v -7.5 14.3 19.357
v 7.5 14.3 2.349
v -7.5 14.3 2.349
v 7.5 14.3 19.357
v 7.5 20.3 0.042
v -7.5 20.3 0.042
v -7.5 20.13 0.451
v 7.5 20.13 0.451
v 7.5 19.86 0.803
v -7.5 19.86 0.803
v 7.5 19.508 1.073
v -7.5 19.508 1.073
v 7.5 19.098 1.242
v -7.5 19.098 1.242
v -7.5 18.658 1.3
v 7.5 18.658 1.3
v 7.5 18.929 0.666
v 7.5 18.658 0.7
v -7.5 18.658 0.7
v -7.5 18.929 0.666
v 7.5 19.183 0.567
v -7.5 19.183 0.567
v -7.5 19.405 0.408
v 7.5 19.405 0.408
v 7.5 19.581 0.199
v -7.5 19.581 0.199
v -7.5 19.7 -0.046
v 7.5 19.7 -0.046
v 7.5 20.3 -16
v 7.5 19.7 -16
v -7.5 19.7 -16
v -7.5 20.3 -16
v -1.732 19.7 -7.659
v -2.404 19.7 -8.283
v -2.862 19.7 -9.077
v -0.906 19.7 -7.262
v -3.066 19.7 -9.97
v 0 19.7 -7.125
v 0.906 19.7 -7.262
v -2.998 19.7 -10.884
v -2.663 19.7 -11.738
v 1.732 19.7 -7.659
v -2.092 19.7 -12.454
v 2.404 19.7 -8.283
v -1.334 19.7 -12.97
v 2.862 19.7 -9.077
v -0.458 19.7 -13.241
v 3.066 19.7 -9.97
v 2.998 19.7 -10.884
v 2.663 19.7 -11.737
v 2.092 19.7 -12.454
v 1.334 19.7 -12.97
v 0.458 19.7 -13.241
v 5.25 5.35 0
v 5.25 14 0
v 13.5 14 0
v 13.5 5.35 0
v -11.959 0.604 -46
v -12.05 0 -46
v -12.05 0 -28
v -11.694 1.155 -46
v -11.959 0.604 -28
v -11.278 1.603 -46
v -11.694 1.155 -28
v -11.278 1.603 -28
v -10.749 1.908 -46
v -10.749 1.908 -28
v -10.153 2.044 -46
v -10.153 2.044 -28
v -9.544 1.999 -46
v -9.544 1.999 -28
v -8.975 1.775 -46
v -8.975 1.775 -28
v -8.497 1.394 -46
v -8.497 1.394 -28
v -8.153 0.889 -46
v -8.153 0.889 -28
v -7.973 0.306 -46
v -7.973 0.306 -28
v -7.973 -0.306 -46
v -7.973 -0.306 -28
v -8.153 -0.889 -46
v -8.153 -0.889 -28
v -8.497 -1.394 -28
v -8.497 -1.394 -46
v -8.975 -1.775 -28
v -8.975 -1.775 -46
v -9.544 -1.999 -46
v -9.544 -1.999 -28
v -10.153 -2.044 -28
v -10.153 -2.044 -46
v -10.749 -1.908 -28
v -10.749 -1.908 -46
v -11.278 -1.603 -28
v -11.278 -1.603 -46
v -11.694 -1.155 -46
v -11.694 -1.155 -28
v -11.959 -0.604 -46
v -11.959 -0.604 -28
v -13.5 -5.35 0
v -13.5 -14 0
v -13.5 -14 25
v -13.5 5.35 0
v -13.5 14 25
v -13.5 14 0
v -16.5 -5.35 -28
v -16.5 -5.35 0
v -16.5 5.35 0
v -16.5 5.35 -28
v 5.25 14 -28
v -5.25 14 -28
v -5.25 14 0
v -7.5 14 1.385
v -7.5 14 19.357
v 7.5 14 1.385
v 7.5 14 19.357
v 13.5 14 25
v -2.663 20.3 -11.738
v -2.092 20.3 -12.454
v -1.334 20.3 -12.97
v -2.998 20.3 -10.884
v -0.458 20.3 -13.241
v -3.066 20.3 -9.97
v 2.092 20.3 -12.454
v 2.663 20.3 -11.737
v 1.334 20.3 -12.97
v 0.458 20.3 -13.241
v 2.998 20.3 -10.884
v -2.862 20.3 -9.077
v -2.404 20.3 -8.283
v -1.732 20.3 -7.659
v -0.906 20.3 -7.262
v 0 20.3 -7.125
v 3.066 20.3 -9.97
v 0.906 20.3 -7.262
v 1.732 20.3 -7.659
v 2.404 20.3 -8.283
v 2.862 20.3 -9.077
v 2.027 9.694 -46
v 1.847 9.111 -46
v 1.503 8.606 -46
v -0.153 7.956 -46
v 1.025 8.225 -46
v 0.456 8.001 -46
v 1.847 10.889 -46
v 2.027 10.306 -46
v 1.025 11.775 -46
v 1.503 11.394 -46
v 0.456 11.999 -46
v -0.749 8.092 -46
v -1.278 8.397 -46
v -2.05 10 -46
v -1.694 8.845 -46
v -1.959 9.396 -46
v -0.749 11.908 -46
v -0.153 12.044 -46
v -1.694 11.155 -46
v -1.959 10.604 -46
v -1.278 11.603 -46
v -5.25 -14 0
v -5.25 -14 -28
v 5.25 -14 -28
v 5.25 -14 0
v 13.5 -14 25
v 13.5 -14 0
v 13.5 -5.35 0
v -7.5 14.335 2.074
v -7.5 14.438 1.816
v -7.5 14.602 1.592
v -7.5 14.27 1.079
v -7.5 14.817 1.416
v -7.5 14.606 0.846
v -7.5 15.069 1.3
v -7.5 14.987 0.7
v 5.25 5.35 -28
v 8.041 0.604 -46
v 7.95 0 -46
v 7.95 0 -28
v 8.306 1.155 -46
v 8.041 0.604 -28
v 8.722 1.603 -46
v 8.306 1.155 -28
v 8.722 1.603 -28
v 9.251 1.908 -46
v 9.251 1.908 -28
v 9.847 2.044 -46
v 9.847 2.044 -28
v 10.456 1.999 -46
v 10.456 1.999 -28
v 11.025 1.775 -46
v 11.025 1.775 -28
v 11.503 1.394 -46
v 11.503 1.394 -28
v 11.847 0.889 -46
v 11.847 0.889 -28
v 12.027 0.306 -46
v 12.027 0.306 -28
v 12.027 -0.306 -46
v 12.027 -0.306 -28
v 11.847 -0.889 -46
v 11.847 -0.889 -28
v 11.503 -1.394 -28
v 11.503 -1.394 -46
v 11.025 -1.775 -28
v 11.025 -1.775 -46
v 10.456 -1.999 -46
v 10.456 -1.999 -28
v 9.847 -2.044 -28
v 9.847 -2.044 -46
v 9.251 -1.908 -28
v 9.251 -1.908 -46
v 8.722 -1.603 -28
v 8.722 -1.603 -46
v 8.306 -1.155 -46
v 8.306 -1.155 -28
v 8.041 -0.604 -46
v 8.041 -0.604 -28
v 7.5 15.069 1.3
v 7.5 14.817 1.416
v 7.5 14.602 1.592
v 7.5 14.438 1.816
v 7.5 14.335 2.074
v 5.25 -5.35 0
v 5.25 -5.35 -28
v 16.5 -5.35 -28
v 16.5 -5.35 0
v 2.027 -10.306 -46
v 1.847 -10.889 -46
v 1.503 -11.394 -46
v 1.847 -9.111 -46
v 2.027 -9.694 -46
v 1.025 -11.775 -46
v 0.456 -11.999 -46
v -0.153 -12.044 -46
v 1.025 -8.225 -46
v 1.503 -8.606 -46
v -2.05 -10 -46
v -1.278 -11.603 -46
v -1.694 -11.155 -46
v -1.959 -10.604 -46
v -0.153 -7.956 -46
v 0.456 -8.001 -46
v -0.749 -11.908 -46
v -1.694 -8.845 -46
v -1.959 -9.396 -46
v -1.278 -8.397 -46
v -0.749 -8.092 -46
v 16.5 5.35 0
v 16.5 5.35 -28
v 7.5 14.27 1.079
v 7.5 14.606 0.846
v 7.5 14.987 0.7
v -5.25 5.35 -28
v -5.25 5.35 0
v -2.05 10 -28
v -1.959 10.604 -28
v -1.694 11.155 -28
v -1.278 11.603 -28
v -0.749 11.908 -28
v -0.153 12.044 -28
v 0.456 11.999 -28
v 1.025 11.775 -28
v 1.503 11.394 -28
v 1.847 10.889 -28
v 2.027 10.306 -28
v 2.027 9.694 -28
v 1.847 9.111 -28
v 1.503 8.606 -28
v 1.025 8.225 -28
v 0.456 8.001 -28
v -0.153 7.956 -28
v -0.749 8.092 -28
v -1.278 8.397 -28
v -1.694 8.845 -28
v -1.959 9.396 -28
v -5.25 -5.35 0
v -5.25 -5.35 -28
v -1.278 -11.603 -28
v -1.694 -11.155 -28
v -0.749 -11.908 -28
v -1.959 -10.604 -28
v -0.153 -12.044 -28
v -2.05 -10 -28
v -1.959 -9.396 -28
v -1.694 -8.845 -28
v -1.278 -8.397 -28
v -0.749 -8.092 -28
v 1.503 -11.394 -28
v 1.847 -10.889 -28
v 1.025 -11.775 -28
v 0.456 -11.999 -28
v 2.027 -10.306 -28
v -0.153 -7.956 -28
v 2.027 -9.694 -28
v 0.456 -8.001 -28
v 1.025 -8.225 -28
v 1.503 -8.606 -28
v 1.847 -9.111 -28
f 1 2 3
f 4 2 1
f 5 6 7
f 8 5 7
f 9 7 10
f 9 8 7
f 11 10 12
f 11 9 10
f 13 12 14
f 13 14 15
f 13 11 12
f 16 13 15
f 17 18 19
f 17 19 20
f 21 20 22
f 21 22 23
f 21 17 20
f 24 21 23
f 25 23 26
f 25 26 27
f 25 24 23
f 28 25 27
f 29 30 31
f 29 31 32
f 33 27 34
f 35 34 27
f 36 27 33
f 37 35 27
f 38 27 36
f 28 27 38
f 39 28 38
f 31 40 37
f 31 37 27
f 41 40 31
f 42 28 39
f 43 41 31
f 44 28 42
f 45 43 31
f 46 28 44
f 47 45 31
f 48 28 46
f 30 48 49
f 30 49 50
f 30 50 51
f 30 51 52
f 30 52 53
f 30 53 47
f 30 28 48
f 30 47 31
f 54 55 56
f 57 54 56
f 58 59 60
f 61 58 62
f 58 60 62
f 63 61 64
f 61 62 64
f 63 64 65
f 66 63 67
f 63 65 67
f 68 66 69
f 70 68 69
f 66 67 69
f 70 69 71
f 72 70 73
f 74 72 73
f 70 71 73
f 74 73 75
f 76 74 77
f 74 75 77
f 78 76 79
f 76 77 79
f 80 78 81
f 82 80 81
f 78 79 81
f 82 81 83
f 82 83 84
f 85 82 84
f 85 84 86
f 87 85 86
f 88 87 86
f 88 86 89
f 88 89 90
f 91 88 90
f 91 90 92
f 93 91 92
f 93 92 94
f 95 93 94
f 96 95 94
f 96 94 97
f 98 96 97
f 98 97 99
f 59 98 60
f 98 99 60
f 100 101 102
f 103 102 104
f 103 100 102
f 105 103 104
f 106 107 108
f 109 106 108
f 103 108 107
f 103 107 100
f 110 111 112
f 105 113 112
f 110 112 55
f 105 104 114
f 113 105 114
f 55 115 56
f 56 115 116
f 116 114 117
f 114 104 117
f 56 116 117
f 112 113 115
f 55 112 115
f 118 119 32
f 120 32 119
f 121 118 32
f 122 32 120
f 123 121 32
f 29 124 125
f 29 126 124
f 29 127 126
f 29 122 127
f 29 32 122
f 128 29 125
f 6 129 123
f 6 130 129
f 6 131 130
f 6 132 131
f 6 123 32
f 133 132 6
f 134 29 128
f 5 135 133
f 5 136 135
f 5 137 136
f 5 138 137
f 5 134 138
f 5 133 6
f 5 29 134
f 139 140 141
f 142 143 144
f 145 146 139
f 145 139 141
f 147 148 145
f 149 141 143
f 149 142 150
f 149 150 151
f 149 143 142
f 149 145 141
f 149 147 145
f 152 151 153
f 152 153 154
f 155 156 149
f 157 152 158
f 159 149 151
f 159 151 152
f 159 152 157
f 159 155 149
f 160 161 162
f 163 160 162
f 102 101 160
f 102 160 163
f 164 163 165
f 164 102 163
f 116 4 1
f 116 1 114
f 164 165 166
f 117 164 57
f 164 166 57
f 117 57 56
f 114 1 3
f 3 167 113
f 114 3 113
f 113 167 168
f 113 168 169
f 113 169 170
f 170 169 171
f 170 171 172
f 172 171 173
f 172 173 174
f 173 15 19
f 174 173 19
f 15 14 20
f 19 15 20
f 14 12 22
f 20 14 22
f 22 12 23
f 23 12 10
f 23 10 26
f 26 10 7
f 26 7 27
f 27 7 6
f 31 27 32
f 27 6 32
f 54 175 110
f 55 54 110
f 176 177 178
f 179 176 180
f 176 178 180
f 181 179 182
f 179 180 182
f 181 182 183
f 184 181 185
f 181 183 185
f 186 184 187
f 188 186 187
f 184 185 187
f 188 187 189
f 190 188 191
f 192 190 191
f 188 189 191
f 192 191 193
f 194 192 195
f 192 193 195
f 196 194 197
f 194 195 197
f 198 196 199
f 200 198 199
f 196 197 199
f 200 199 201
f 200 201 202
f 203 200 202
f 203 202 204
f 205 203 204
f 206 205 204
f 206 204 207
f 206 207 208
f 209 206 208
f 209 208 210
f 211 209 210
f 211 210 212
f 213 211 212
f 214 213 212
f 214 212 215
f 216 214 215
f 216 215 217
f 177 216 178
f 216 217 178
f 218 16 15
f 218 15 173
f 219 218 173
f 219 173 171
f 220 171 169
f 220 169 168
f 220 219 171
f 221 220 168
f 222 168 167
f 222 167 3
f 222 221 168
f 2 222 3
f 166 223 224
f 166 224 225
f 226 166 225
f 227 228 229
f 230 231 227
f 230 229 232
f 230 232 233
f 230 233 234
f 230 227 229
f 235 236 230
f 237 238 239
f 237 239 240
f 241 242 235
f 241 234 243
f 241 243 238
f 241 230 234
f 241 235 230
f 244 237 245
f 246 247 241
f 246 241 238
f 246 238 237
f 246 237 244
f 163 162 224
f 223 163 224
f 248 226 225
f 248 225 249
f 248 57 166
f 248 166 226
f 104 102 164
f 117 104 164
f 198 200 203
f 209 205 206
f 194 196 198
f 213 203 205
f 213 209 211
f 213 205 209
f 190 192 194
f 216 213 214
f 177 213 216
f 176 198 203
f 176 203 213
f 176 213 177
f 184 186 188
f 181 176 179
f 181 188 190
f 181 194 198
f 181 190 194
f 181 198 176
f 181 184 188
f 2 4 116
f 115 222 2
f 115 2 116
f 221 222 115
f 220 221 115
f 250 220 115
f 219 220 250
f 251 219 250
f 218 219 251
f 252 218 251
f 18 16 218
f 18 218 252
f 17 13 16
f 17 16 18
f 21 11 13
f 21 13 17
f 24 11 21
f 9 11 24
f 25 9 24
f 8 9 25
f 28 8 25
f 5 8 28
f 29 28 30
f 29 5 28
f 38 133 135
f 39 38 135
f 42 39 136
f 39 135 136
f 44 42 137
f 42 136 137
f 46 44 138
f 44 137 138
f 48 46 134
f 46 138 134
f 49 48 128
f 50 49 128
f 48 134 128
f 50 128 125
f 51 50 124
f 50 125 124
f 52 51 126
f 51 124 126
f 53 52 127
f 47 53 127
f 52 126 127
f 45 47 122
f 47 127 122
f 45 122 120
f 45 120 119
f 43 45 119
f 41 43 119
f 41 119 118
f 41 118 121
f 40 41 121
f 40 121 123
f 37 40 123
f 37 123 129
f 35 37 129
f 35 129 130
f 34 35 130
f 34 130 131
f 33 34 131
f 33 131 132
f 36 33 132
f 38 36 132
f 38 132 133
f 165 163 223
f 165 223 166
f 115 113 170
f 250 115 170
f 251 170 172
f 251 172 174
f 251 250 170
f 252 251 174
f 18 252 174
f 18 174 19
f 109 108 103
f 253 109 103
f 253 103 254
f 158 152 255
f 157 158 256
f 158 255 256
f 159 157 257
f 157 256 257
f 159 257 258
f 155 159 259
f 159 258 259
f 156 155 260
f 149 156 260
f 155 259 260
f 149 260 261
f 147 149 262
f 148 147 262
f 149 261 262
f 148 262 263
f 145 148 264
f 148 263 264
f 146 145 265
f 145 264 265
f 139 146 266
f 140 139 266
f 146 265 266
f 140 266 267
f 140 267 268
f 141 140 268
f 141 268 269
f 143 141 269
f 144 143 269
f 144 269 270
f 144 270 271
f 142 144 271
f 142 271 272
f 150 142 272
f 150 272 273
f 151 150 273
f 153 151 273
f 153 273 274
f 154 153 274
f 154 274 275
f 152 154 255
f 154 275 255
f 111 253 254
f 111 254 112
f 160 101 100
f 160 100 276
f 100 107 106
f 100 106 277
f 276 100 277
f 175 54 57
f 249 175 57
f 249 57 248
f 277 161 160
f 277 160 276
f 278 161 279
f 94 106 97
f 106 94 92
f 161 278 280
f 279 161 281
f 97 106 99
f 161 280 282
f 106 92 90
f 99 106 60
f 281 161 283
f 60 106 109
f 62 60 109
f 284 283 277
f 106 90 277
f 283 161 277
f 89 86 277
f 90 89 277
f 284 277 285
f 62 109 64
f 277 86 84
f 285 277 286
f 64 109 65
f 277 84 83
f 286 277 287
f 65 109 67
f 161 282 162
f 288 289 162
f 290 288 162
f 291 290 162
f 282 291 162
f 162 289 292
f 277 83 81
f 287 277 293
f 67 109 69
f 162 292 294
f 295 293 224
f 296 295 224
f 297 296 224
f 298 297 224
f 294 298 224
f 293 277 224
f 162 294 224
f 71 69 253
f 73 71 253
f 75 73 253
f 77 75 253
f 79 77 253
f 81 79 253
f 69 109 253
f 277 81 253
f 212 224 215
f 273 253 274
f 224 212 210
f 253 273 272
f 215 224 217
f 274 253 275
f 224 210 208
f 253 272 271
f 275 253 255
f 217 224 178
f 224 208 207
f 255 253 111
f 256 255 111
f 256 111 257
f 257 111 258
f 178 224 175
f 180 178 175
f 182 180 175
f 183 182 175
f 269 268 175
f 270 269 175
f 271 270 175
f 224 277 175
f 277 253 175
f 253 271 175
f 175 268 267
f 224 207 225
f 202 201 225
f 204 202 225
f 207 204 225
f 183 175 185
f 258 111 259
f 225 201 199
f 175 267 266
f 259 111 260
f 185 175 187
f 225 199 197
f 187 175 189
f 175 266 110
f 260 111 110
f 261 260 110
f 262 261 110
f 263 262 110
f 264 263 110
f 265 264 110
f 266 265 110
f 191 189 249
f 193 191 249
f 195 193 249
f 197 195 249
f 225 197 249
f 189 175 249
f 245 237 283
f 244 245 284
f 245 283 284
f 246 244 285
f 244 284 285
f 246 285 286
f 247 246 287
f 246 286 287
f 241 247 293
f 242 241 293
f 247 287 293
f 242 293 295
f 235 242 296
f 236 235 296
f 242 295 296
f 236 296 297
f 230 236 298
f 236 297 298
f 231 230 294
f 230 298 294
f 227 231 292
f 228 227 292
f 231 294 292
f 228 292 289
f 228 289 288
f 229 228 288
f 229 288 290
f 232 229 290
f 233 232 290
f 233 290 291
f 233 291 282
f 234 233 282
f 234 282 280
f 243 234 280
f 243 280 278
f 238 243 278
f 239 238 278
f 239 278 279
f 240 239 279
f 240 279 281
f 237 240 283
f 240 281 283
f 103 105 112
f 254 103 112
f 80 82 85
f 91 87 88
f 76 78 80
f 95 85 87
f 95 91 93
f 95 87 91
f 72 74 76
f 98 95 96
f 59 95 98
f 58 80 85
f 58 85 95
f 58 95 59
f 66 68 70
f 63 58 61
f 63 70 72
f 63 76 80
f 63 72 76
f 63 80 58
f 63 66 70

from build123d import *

# Parameters (mm, degrees)
SKETCH1_W           = 27
SKETCH1_H           = 28
BOSS_EXTRUDE1_DEPTH = 25
SKETCH2_W           = 33
SKETCH2_H           = 10.7
SKETCH2_W_2         = 10.5
SKETCH2_H_2         = 28
BOSS_EXTRUDE2_DEPTH = 28
SKETCH3_R           = 2.05
BOSS_EXTRUDE3_DEPTH = 18
EXTRUDE_THIN1_DEPTH = 7.5
MOUNTING_HOLE_REACH = 61.705
SKETCH5_R           = 3.075


with BuildPart() as part:
    # Sketch1 → Boss-Extrude1 (new body)
    with BuildSketch(Plane.XY):
        Rectangle(SKETCH1_W, SKETCH1_H)
    extrude(amount=BOSS_EXTRUDE1_DEPTH)

    # Sketch2 → Boss-Extrude2 (add)
    with BuildSketch(Plane.XY):
        Rectangle(SKETCH2_W, SKETCH2_H)
        Rectangle(SKETCH2_W_2, SKETCH2_H_2)
    extrude(amount=-BOSS_EXTRUDE2_DEPTH)

    # Sketch3 → Boss-Extrude3 (add)
    with BuildSketch(Plane(origin=(0, 0, -28), x_dir=(-1, 0, 0), z_dir=(0, 0, -1))):
        with Locations((-10, 0)):
            Circle(SKETCH3_R)
        with Locations((10, 0)):
            Circle(SKETCH3_R)
        with Locations((0, 10)):
            Circle(SKETCH3_R)
        with Locations((0, -10)):
            Circle(SKETCH3_R)
    extrude(amount=BOSS_EXTRUDE3_DEPTH)

    # Sketch4 → Extrude-Thin1 (add, symmetric)
    with BuildSketch(Plane(origin=(0, 0, 0), x_dir=(0, 0, -1), z_dir=(1, 0, 0))):
        with BuildLine():
            Line((-19.356513239, 13.7), (-2.349136171, 13.7))
            ThreePointArc((-2.349136171, 13.7), (-1.303107706, 14.059916252), (-0.7, 14.987265351))
            Line((-0.7, 14.987265351), (-0.7, 18.658359214))
            ThreePointArc((-0.7, 18.658359214), (-0.494115365, 19.29910699), (0.04646857, 19.7))
            Line((0.04646857, 19.7), (16, 19.7))
            Line((16, 19.7), (16, 20.3))
            Line((16, 20.3), (-0.041605625, 20.3))
            ThreePointArc((-0.041605625, 20.3), (-0.949208947, 19.692590918), (-1.3, 18.658359214))
            Line((-1.3, 18.658359214), (-1.3, 15.069374388))
            ThreePointArc((-1.3, 15.069374388), (-1.698631818, 14.512957675), (-2.349136171, 14.3))
            Line((-2.349136171, 14.3), (-19.356513239, 14.3))
            Line((-19.356513239, 14.3), (-19.356513239, 13.7))
        make_face()
    extrude(amount=EXTRUDE_THIN1_DEPTH, both=True)

    # Sketch5 → Mounting Hole (cut, up to next)
    with BuildSketch(Plane(origin=(0, 20.3, 0), x_dir=(1, 0, 0), z_dir=(0, 1, 0)), mode=Mode.PRIVATE) as mounting_hole_sk1:
        with Locations(Location((0, 10.2, 0), (0, 0, 270))):
            Circle(SKETCH5_R)
    mounting_hole_tool1 = extrude(mounting_hole_sk1.sketch, amount=-MOUNTING_HOLE_REACH, mode=Mode.PRIVATE) & part.part
    add(mounting_hole_tool1.solids().sort_by_distance((0, 20.3, -10.2))[0], mode=Mode.SUBTRACT)


solid = part.part
